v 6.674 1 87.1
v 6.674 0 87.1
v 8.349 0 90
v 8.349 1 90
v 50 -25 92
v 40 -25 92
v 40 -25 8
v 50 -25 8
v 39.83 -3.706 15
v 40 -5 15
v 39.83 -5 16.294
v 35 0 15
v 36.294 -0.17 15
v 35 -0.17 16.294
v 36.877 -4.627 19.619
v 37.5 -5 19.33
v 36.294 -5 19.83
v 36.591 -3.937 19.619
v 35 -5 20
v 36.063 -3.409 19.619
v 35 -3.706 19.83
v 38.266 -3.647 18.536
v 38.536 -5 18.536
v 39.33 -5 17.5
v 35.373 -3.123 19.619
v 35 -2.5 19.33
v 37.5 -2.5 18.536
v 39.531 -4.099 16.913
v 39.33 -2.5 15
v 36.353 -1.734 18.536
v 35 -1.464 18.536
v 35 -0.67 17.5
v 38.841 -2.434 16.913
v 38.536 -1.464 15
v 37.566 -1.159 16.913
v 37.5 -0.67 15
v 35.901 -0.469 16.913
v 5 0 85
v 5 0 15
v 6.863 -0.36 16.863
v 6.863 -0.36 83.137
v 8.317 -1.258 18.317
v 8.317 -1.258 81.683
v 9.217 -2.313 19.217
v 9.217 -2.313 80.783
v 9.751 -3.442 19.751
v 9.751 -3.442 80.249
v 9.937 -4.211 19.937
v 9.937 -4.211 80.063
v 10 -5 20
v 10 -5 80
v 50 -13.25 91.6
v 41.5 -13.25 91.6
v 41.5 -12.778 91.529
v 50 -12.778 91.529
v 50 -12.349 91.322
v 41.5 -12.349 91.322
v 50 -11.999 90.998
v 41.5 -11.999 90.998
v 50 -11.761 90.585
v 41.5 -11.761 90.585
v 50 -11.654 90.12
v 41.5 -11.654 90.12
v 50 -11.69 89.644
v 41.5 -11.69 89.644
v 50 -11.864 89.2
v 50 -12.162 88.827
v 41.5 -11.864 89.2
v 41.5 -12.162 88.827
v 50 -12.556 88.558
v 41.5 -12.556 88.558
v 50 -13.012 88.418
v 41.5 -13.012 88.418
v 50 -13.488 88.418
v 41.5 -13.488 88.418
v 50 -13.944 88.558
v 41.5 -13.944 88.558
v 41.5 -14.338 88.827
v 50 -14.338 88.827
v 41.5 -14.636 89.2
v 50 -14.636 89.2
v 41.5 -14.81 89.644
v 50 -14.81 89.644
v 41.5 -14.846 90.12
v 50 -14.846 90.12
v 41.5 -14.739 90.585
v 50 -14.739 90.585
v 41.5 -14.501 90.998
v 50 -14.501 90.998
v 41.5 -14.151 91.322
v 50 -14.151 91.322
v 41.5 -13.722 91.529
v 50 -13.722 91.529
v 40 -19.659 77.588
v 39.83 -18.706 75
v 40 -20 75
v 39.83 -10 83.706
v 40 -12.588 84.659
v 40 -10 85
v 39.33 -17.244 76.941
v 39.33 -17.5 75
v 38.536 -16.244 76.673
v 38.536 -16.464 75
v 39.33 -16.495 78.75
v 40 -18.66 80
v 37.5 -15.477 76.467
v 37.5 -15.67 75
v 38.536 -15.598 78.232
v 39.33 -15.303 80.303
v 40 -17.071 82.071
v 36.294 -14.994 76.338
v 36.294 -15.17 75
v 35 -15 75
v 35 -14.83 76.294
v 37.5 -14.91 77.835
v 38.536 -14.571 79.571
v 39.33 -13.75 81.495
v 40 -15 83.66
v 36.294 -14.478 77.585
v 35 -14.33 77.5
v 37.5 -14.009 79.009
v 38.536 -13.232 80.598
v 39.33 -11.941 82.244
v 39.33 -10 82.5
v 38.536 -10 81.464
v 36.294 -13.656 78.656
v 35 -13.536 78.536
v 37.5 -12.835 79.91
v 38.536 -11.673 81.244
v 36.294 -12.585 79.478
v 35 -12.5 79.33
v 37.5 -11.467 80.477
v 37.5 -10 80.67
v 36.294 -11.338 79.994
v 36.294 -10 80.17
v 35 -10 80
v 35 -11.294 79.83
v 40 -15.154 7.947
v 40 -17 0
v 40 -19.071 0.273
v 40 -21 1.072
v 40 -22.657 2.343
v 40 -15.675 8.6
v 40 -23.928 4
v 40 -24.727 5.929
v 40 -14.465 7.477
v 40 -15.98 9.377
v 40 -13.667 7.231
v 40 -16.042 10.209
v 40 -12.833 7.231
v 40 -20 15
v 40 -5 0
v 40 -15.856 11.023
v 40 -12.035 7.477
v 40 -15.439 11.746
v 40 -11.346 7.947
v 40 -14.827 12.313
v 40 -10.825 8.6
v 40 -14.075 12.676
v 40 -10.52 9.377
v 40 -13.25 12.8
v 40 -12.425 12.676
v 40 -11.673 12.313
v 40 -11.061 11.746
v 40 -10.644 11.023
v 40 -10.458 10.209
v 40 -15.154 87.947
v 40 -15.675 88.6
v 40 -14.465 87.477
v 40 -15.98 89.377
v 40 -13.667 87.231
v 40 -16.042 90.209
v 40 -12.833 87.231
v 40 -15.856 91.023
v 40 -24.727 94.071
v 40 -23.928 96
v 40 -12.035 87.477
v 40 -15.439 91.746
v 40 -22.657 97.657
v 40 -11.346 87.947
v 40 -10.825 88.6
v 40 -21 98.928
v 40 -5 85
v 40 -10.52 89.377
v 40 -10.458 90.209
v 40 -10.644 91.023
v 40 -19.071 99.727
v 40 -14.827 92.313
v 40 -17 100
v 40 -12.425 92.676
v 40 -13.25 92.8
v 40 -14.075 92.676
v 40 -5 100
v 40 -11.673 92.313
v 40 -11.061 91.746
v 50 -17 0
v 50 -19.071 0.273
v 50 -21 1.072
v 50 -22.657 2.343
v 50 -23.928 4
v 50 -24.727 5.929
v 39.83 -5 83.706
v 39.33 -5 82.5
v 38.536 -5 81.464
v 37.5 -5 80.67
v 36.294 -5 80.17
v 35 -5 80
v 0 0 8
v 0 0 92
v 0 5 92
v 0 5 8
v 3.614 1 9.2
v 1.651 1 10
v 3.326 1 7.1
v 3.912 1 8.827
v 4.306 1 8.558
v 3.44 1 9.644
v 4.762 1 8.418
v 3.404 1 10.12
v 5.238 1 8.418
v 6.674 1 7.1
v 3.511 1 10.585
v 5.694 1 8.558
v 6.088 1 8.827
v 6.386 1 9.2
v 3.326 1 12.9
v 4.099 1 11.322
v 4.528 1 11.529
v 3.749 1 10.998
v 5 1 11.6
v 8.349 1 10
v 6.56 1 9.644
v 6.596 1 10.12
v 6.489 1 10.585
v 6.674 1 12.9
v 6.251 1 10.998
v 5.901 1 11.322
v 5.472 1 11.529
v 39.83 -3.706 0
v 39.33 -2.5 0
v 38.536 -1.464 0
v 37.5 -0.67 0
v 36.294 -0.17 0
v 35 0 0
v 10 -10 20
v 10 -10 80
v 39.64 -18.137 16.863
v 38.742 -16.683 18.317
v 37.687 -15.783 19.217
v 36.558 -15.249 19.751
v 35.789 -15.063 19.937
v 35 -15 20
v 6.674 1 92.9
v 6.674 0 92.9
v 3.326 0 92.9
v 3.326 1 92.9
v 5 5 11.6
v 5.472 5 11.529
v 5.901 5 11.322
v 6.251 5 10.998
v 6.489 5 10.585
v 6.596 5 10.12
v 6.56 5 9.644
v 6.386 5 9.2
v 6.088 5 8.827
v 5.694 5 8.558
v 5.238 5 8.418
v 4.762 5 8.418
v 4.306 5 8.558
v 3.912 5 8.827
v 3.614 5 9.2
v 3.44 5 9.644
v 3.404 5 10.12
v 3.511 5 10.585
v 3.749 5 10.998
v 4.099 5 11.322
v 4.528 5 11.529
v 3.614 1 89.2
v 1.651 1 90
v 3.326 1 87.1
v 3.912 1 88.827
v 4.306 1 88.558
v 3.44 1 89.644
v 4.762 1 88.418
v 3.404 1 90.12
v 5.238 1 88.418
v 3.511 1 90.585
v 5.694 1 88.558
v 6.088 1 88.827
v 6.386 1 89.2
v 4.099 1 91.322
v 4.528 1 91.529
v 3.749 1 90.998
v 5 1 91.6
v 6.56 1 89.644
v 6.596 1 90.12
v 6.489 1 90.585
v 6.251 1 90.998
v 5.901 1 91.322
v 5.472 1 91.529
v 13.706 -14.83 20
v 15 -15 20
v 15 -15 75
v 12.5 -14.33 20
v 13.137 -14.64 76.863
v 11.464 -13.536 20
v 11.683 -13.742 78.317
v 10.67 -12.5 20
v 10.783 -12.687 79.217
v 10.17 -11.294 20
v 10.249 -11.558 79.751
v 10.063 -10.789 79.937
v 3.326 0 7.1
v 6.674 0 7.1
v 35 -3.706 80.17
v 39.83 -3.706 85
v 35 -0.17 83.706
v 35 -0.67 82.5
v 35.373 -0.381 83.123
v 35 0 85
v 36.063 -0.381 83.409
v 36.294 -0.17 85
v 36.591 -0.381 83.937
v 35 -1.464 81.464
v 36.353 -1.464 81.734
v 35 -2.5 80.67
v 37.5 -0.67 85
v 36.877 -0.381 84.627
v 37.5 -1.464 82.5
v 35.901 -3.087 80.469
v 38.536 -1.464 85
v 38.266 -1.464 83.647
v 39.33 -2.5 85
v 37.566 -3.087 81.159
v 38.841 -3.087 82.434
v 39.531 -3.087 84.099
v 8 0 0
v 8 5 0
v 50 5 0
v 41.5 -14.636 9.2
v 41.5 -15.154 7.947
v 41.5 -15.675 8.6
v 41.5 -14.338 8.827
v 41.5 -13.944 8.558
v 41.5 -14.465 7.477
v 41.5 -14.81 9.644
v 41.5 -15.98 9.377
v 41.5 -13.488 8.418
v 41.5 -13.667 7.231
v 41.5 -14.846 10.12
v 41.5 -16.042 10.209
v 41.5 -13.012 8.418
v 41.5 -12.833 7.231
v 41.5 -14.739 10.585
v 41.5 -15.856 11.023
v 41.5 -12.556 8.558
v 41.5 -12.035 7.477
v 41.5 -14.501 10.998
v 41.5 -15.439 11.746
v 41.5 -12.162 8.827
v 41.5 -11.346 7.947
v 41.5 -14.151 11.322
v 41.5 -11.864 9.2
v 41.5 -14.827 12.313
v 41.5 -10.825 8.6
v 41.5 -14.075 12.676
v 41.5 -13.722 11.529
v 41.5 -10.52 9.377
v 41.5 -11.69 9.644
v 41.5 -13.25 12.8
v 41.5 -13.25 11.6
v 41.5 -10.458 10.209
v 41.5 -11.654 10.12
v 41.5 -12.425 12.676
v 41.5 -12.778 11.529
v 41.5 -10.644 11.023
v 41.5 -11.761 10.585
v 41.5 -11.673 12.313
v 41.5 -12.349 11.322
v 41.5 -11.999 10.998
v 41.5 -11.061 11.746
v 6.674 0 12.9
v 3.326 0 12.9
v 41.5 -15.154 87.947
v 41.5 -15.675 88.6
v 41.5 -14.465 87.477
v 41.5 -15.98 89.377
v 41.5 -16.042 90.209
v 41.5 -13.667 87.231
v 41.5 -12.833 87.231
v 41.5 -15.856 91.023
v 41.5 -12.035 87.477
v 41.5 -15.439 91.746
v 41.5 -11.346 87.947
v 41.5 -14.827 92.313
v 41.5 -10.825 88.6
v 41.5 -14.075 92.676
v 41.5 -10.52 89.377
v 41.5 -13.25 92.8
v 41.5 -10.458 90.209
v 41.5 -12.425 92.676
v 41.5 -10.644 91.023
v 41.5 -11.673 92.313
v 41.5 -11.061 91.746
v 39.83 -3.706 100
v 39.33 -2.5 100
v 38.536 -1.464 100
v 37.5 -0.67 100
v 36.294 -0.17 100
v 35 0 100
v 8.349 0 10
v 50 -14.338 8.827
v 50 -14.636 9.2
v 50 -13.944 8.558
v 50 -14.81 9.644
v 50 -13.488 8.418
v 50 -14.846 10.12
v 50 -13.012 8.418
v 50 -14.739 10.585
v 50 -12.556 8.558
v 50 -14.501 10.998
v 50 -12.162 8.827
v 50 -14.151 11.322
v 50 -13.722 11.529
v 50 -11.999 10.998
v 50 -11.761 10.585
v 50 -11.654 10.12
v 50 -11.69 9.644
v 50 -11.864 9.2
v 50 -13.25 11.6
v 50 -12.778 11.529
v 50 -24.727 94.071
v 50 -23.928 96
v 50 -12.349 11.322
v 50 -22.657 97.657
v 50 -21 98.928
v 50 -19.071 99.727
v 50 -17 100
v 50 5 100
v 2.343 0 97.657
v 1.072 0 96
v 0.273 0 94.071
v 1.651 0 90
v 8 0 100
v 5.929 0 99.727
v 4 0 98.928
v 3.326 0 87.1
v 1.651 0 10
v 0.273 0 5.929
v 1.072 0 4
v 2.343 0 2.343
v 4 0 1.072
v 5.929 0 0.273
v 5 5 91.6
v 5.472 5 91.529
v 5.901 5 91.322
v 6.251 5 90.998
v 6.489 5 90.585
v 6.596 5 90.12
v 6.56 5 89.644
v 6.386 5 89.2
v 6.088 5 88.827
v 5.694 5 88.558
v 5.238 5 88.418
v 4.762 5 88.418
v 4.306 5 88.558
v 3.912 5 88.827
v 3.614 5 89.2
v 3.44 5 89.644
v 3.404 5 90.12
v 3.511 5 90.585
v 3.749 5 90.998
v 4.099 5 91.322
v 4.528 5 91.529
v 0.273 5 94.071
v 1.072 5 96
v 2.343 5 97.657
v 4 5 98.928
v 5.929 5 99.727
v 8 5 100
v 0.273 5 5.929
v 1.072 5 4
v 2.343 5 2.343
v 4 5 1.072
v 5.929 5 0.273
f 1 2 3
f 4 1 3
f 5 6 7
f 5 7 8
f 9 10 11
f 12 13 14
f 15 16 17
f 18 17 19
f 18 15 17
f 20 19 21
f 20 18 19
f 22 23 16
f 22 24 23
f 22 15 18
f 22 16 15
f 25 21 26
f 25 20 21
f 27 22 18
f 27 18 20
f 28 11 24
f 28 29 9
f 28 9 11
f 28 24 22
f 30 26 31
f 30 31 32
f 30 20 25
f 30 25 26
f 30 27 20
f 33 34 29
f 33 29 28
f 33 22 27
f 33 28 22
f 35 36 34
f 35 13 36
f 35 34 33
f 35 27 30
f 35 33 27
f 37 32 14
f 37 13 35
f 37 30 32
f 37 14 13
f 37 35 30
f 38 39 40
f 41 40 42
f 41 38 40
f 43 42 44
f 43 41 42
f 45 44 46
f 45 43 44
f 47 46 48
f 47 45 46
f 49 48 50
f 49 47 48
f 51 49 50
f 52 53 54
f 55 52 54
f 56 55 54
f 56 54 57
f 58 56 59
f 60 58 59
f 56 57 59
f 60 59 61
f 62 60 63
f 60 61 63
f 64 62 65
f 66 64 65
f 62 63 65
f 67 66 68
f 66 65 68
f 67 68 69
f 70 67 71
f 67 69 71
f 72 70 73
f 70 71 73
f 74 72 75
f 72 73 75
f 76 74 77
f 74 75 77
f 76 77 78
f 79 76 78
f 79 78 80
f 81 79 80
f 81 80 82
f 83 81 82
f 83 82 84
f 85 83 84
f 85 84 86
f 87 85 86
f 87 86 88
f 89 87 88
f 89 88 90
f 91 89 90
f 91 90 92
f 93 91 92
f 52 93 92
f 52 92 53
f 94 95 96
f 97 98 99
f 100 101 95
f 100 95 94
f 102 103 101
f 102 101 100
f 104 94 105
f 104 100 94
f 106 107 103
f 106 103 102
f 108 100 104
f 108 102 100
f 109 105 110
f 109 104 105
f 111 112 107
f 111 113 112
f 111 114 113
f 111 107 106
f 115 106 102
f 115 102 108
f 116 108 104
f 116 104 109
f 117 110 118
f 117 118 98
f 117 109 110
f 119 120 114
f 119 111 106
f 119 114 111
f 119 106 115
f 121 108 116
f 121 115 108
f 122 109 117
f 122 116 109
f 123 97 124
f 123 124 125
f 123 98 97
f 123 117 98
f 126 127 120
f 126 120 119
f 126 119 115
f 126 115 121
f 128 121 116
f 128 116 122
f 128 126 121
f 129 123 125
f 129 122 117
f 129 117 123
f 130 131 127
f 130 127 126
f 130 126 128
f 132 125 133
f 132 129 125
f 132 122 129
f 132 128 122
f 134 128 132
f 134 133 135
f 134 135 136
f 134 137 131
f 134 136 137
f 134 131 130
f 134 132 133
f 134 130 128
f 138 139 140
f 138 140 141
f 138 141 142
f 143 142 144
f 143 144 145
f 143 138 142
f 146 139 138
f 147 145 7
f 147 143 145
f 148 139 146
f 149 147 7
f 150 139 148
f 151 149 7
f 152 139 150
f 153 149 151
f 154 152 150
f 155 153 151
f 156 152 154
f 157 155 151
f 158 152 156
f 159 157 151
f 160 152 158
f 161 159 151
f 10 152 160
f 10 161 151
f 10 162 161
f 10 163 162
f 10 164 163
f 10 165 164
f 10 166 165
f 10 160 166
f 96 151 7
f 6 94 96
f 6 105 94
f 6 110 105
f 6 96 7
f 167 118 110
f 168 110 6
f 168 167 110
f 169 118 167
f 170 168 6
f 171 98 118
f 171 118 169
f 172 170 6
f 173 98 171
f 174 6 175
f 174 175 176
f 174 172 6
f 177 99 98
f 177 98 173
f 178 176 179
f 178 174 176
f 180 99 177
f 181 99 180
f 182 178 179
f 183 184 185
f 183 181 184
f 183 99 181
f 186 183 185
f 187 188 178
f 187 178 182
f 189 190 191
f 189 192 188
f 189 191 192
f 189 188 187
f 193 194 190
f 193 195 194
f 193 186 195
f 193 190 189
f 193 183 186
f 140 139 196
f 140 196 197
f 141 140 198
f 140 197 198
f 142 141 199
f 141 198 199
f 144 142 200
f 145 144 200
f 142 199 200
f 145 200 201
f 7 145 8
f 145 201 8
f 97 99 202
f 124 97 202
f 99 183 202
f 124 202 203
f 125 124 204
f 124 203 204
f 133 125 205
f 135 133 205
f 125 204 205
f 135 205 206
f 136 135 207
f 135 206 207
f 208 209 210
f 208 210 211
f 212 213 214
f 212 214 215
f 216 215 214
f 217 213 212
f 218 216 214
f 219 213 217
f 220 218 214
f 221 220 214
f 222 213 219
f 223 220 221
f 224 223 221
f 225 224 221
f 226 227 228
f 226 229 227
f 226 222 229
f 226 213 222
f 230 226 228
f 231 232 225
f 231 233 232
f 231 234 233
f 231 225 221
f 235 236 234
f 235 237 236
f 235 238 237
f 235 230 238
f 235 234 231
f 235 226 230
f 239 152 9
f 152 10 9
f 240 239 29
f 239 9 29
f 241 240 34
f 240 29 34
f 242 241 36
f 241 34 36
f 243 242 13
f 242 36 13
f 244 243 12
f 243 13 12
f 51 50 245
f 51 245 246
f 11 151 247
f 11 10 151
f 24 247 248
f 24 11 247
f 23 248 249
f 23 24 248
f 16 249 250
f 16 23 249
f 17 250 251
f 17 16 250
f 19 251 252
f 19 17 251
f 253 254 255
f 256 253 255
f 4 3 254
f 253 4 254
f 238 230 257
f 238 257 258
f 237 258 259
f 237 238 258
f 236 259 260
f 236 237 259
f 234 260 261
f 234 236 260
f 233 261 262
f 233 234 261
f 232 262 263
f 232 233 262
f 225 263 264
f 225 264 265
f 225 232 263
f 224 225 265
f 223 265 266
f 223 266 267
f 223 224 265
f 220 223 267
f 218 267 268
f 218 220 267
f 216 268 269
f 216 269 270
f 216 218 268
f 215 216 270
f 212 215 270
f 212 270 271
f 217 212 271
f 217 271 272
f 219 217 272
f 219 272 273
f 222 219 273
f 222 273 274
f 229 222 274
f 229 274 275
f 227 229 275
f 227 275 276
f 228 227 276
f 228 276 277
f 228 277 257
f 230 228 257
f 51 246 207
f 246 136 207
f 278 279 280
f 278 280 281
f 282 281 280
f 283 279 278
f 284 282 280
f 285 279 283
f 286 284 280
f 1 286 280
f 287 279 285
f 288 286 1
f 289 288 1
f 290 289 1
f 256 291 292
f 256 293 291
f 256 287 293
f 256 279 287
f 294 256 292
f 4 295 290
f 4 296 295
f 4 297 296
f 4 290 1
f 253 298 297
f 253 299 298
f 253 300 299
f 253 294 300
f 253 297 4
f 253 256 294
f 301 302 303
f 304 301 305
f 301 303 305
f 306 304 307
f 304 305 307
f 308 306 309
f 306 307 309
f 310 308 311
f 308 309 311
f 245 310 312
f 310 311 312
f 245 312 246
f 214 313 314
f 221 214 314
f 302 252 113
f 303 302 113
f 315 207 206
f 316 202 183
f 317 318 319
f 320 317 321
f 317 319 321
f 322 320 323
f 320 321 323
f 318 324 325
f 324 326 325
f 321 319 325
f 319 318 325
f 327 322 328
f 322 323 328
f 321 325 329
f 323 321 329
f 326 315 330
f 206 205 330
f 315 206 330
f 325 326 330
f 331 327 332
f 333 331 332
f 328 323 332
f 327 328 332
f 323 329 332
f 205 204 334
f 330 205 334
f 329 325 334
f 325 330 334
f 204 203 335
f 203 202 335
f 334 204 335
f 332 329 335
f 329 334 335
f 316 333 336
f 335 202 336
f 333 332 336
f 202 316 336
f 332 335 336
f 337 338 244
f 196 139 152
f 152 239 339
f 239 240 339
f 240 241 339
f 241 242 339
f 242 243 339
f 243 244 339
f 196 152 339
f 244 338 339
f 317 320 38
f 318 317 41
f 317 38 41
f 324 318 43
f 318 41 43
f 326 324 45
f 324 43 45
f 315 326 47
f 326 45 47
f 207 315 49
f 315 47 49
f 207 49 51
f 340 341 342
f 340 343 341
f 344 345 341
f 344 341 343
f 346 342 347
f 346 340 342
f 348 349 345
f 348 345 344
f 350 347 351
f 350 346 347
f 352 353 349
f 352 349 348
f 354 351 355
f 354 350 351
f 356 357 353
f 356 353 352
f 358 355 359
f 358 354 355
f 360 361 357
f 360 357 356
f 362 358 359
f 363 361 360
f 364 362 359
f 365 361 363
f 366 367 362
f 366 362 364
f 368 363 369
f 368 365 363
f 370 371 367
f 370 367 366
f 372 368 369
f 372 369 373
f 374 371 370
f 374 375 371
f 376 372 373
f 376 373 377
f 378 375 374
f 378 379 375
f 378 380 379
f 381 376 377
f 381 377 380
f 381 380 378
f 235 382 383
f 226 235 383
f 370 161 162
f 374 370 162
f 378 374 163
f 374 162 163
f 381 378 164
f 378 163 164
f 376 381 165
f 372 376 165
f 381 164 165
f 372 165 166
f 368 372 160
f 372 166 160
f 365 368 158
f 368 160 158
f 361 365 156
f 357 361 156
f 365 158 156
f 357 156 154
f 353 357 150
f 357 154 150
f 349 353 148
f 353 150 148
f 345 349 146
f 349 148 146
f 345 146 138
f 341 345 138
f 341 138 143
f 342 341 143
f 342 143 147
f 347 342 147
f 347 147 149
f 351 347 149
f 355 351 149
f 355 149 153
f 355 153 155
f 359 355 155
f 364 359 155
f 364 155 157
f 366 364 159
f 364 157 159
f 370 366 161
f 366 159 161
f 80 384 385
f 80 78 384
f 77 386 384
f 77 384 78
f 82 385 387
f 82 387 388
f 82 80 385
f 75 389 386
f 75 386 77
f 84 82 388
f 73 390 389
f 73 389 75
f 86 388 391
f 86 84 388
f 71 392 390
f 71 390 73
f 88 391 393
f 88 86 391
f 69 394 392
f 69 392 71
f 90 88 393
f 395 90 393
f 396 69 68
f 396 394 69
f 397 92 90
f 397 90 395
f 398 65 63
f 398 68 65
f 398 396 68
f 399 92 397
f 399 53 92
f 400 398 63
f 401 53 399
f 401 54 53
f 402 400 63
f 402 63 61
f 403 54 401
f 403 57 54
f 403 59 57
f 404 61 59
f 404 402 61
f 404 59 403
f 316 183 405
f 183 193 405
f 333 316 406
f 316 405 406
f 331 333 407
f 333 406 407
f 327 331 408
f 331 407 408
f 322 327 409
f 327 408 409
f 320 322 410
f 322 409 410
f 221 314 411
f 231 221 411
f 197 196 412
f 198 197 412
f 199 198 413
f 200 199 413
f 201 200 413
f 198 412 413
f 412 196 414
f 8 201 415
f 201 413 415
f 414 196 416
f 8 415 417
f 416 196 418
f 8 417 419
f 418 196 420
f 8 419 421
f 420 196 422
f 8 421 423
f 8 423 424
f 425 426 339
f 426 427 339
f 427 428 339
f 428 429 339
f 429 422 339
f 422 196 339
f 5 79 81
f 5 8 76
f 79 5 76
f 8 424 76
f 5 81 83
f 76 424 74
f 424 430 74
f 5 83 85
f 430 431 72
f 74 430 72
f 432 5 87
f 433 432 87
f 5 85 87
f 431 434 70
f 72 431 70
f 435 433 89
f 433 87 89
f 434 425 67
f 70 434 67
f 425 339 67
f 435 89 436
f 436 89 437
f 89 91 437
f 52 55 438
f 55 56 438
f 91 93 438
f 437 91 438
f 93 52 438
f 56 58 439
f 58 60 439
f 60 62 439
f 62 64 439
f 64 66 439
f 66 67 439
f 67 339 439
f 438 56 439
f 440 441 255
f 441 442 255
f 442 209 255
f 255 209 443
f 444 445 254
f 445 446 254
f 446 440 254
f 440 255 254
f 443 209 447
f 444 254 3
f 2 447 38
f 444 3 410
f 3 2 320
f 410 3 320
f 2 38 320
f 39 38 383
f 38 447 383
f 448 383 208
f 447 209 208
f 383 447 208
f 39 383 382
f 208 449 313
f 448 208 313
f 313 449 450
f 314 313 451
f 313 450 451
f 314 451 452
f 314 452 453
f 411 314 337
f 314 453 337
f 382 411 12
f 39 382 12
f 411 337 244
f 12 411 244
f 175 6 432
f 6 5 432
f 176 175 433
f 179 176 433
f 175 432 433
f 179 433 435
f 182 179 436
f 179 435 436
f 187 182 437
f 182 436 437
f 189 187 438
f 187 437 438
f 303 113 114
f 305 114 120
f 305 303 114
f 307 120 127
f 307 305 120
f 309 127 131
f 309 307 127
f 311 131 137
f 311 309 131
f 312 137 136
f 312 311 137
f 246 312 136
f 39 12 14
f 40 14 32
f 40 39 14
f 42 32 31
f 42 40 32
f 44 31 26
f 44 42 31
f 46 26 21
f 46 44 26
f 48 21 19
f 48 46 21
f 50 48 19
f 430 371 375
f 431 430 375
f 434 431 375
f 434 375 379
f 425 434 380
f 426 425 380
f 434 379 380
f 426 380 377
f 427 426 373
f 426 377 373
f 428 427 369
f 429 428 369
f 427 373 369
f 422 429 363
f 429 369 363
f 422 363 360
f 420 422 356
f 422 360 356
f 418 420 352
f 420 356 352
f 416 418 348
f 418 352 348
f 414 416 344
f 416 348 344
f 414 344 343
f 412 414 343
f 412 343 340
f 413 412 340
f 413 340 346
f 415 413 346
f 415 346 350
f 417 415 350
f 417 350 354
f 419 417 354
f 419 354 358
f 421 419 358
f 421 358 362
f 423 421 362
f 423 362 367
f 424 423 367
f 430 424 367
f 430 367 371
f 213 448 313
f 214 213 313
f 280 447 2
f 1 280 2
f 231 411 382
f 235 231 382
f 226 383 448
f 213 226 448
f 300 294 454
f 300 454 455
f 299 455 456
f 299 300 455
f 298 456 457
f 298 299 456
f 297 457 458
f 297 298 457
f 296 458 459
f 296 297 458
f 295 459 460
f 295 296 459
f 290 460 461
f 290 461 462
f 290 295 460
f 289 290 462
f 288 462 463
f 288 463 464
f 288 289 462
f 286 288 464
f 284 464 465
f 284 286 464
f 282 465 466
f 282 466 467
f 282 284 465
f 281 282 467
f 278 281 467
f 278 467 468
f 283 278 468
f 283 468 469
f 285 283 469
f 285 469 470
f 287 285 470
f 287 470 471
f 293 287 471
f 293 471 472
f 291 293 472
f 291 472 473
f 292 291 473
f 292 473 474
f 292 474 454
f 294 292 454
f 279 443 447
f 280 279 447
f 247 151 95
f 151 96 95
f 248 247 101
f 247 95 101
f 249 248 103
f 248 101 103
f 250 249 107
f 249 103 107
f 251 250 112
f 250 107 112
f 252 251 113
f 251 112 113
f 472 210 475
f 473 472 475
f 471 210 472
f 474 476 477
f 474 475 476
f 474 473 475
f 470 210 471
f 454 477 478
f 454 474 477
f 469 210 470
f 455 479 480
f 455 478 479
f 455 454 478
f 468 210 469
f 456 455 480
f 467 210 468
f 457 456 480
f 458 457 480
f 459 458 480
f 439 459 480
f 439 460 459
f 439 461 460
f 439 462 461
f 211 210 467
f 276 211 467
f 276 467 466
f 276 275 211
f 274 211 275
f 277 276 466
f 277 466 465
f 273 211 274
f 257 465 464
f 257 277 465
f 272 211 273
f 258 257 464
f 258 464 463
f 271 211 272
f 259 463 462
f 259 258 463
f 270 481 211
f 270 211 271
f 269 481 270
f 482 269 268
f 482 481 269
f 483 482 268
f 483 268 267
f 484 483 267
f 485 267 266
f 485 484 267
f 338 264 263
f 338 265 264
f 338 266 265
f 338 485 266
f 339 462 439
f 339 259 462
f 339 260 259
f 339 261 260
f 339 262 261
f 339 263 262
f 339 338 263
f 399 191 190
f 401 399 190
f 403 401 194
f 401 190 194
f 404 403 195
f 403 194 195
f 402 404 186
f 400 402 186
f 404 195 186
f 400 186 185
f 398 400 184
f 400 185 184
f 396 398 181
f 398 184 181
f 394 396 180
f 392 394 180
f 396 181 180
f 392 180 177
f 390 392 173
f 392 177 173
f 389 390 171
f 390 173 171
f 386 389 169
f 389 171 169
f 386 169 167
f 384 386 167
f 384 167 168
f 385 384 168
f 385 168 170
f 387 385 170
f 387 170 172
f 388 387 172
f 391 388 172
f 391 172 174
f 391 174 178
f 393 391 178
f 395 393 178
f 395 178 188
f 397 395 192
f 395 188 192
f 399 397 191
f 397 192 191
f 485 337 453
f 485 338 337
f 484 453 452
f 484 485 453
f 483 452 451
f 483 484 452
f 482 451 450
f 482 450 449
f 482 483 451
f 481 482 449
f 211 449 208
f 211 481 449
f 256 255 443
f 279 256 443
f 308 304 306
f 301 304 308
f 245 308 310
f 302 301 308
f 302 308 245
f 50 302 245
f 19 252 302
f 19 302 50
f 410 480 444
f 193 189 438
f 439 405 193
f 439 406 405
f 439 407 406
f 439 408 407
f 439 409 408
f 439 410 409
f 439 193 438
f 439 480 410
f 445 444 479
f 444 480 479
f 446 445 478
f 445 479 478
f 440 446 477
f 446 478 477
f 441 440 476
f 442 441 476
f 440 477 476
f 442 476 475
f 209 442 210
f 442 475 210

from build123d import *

# Parameters (mm, degrees)
CROQUIS1_W              = 50
CROQUIS1_H              = 100
CROQUIS1_R              = 1.6
SALIENTE_EXTRUIR1_DEPTH = 5
CROQUIS2_W              = 10
CROQUIS2_H              = 100
SALIENTE_EXTRUIR2_DEPTH = 25
CROQUIS3_R              = 1.6
CORTAR_EXTRUIR1_DEPTH   = 10
CORTAR_EXTRUIR2_DEPTH   = 1
REDONDEO1_R             = 8
CROQUIS5_W              = 60
CROQUIS5_H              = 15
SALIENTE_EXTRUIR3_DEPTH = 30
REDONDEO2_R             = 5
CROQUIS6_R              = 2.8
CORTAR_EXTRUIR3_DEPTH   = 1.5


with BuildPart() as part:
    # Croquis1 → Saliente-Extruir1 (new body)
    with BuildSketch(Plane(origin=(0, 0, 0), x_dir=(1, 0, 0), z_dir=(0, 1, 0))):
        with Locations((25, -50)):
            Rectangle(CROQUIS1_W, CROQUIS1_H)
        with Locations(Location((5, -10, 0), (0, 0, 270))):
            Circle(CROQUIS1_R, mode=Mode.SUBTRACT)
        with Locations(Location((5, -90, 0), (0, 0, 270))):
            Circle(CROQUIS1_R, mode=Mode.SUBTRACT)
    extrude(amount=SALIENTE_EXTRUIR1_DEPTH)

    # Croquis2 → Saliente-Extruir2 (add)
    with BuildSketch(Plane.XZ):
        with Locations((45, 50)):
            Rectangle(CROQUIS2_W, CROQUIS2_H)
    extrude(amount=SALIENTE_EXTRUIR2_DEPTH)

    # Croquis3 → Cortar-Extruir1 (cut)
    with BuildSketch(Plane.ZY.offset(-40)):
        with Locations((10, -13.25)):
            Circle(CROQUIS3_R)
        with Locations((90, -13.25)):
            Circle(CROQUIS3_R)
    extrude(amount=-CORTAR_EXTRUIR1_DEPTH, mode=Mode.SUBTRACT)

    # Croquis4 → Cortar-Extruir2 (cut)
    with BuildSketch(Plane.XZ):
        Polygon((3.325684219, 7.1), (6.674315781, 7.1), (8.348631561, 10), (6.674315781, 12.9), (3.325684219, 12.9), (1.651368439, 10), align=None)
        Polygon((3.325684219, 87.1), (6.674315781, 87.1), (8.348631561, 90), (6.674315781, 92.9), (3.325684219, 92.9), (1.651368439, 90), align=None)
    extrude(amount=-CORTAR_EXTRUIR2_DEPTH, mode=Mode.SUBTRACT)

    # Redondeo1
    redondeo1_edges = [part.edges().sort_by_distance(p)[0] for p in [
        (45, -25, 100),
        (45, -25, 0),
        (0, 2.5, 0),
        (0, 2.5, 100),
    ]]
    fillet(redondeo1_edges, radius=REDONDEO1_R)

    # Croquis5 → Saliente-Extruir3 (add)
    with BuildSketch(Plane.ZY.offset(-40)):
        with Locations((50, -7.5)):
            Rectangle(CROQUIS5_W, CROQUIS5_H)
    extrude(amount=SALIENTE_EXTRUIR3_DEPTH)

    # Redondeo2
    redondeo2_edges = [part.edges().sort_by_distance(p)[0] for p in [
        (40, 0, 10),
        (40, -7.5, 20),
        (25, 0, 20),
        (40, -15, 50),
        (40, -7.5, 80),
        (25, -15, 80),
        (25, 0, 80),
        (10, -15, 50),
        (10, 0, 50),
        (40, 0, 90),
    ]]
    fillet(redondeo2_edges, radius=REDONDEO2_R)

    # Croquis6 → Cortar-Extruir3 (cut)
    with BuildSketch(Plane.ZY.offset(-40)):
        with Locations((10, -13.25)):
            Circle(CROQUIS6_R)
        with Locations((90, -13.25)):
            Circle(CROQUIS6_R)
    extrude(amount=-CORTAR_EXTRUIR3_DEPTH, mode=Mode.SUBTRACT)


solid = part.part
